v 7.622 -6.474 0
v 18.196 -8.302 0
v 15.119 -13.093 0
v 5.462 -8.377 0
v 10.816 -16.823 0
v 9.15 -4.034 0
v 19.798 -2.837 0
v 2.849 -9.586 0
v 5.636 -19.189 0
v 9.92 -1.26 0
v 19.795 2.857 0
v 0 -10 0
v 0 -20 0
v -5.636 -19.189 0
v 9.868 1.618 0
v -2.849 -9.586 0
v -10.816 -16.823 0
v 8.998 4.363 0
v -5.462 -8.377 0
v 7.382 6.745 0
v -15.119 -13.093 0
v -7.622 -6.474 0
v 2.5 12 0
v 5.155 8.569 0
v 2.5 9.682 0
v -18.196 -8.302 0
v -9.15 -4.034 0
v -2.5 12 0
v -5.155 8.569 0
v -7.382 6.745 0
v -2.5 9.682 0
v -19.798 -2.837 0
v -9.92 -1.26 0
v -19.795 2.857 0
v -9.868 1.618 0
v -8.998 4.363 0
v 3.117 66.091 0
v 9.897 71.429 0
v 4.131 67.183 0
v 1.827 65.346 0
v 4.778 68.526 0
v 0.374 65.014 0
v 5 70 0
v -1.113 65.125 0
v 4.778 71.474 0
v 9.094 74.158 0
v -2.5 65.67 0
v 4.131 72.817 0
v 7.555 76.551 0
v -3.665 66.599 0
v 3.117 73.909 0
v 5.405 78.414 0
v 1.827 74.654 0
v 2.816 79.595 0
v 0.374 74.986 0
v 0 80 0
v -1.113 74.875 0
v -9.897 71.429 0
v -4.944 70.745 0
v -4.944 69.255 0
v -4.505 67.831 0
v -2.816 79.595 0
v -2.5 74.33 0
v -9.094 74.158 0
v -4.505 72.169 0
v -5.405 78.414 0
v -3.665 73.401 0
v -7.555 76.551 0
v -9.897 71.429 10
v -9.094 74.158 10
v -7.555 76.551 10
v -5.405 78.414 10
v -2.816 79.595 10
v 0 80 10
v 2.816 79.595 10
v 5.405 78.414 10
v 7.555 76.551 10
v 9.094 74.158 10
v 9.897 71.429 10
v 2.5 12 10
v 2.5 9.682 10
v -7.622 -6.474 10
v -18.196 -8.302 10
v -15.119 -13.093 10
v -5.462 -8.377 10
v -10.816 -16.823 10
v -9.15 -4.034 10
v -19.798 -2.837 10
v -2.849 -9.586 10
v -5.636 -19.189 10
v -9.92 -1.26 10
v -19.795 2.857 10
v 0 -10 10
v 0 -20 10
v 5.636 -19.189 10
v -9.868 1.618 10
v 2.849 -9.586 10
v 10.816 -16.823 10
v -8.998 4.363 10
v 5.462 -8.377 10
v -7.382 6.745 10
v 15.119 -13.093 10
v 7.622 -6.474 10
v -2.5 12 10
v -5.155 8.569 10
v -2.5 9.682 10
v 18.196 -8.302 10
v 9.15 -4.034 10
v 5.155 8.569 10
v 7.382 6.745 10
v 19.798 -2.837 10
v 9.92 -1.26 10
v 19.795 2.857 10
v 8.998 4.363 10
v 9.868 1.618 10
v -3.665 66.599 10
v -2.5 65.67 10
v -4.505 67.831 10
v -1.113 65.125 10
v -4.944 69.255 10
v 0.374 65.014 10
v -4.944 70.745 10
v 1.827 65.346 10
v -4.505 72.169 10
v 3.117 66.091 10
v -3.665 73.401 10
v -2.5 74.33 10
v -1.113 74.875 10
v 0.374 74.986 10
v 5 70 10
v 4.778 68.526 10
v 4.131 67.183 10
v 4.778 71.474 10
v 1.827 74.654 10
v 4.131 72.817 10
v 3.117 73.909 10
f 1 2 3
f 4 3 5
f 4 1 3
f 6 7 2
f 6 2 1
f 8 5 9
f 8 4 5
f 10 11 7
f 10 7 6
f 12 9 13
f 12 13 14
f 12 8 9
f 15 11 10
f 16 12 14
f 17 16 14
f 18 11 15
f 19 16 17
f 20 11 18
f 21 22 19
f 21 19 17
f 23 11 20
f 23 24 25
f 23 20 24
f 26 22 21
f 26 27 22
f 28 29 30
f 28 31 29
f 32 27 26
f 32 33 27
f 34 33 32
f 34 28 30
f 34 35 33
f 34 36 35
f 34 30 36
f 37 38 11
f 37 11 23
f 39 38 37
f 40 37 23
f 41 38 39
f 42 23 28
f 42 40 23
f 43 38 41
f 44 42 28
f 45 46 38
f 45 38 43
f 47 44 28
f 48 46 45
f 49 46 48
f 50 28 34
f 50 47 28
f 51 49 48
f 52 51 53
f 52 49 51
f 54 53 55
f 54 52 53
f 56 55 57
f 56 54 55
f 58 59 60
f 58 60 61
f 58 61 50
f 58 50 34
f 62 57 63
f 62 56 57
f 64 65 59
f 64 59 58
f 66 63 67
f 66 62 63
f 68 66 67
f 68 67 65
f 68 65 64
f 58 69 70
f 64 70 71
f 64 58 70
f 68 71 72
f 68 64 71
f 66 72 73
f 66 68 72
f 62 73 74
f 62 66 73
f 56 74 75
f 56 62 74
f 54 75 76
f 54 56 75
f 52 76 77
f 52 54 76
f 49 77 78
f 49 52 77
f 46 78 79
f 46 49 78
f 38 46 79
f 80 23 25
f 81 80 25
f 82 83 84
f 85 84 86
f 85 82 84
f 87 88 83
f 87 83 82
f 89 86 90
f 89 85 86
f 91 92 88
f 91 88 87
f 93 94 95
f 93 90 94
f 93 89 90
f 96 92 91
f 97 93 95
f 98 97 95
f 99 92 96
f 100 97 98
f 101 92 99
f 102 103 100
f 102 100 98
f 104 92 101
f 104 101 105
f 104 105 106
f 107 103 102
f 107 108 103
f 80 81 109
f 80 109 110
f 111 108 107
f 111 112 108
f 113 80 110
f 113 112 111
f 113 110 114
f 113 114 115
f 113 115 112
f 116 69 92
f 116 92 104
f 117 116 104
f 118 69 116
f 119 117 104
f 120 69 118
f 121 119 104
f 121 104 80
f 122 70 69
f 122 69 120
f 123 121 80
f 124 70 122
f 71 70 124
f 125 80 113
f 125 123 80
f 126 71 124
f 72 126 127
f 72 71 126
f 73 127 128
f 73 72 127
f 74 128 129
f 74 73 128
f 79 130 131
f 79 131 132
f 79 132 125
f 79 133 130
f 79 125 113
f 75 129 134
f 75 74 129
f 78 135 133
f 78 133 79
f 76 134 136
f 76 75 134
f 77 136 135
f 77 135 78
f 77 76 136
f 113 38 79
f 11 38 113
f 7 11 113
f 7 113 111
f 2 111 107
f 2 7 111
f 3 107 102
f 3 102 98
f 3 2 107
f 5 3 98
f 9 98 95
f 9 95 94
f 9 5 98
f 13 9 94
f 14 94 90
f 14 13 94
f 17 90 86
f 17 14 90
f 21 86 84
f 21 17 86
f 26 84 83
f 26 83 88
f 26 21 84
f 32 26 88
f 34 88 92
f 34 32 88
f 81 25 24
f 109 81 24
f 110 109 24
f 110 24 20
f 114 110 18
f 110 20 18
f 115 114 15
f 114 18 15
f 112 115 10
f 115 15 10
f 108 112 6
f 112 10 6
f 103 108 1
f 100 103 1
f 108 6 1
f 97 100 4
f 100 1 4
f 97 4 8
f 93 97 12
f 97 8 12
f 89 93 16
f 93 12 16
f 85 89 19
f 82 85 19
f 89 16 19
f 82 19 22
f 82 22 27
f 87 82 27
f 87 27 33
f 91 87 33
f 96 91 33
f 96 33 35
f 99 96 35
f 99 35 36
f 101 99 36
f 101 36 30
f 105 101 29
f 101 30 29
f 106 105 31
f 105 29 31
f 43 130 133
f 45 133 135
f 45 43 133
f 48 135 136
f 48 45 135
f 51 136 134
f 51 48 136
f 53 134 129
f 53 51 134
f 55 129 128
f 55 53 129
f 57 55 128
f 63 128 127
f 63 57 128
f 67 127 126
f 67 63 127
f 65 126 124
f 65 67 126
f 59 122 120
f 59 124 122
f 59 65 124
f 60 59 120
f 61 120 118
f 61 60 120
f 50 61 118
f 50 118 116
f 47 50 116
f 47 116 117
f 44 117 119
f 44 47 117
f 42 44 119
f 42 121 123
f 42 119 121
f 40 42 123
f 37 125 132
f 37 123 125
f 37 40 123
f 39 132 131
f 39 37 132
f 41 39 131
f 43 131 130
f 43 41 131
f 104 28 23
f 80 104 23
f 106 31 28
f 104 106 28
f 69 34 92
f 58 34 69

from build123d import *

# Parameters (mm, degrees)
SKETCH2_R           = 5
BOSS_EXTRUDE1_DEPTH = 10
SKETCH3_R           = 10
SKETCH3_R_2         = 5
BOSS_EXTRUDE2_DEPTH = 76.2
BOSS_EXTRUDE3_START = 86.2
SKETCH2_2_R         = 5
BOSS_EXTRUDE3_DEPTH = 22
SKETCH5_R           = 65
BOSS_EXTRUDE4_DEPTH = 22
SKETCH6_R           = 55
CUT_EXTRUDE1_DEPTH  = 22
SKETCH7_R           = 80
CUT_EXTRUDE2_DEPTH  = 143.366569109


with BuildPart() as part:
    # Sketch2 → Boss-Extrude1 (new body)
    with BuildSketch(Plane.XY):
        with BuildLine():
            Line((-19.794866372, 2.857142857), (-9.897433186, 71.428571429))
            ThreePointArc((-9.897433186, 71.428571429), (0, 80), (9.897433186, 71.428571429))
            Line((9.897433186, 71.428571429), (19.794866372, 2.857142857))
            ThreePointArc((19.794866372, 2.857142857), (0, -20), (-19.794866372, 2.857142857))
        make_face()
        with Locations((0, 70)):
            Circle(SKETCH2_R, mode=Mode.SUBTRACT)
        with BuildLine():
            Line((-2.5, 9.682458366), (-2.5, 12))
            Line((-2.5, 12), (2.5, 12))
            Line((2.5, 12), (2.5, 9.682458366))
            ThreePointArc((2.5, 9.682458366), (0, -10), (-2.5, 9.682458366))
        make_face(mode=Mode.SUBTRACT)
    extrude(amount=BOSS_EXTRUDE1_DEPTH)

    # Sketch3 → Boss-Extrude2 (add)
    with BuildSketch(Plane.XY.offset(10)):
        with Locations(Location((0, 70, 0), (0, 0, 171.786789298))):
            Circle(SKETCH3_R)
        with Locations((0, 70)):
            Circle(SKETCH3_R_2, mode=Mode.SUBTRACT)
    extrude(amount=BOSS_EXTRUDE2_DEPTH)

    # Sketch2<2> → Boss-Extrude3 (add)
    with BuildSketch(Plane.XY.offset(BOSS_EXTRUDE3_START)):
        with BuildLine():
            Line((-19.794866372, 2.857142857), (-9.897433186, 71.428571429))
            ThreePointArc((-9.897433186, 71.428571429), (0, 80), (9.897433186, 71.428571429))
            Line((9.897433186, 71.428571429), (19.794866372, 2.857142857))
            ThreePointArc((19.794866372, 2.857142857), (0, -20), (-19.794866372, 2.857142857))
        make_face()
        with Locations((0, 70)):
            Circle(SKETCH2_2_R, mode=Mode.SUBTRACT)
        with BuildLine():
            Line((-2.5, 9.682458366), (-2.5, 12))
            Line((-2.5, 12), (2.5, 12))
            Line((2.5, 12), (2.5, 9.682458366))
            ThreePointArc((2.5, 9.682458366), (0, -10), (-2.5, 9.682458366))
        make_face(mode=Mode.SUBTRACT)
    extrude(amount=BOSS_EXTRUDE3_DEPTH)

    # Sketch5 → Boss-Extrude4 (add)
    with BuildSketch(Plane.XY.offset(108.2)):
        Circle(SKETCH5_R)
    extrude(amount=-BOSS_EXTRUDE4_DEPTH)

    # Sketch6 → Cut-Extrude1 (cut)
    with BuildSketch(Plane.XY.offset(108.2)):
        Circle(SKETCH6_R)
    extrude(amount=-CUT_EXTRUDE1_DEPTH, mode=Mode.SUBTRACT)

    # Sketch7 → Cut-Extrude2 (cut, through all)
    with BuildSketch(Plane.XY.offset(10)):
        Circle(SKETCH7_R)
    extrude(amount=CUT_EXTRUDE2_DEPTH, mode=Mode.SUBTRACT)


solid = part.part
